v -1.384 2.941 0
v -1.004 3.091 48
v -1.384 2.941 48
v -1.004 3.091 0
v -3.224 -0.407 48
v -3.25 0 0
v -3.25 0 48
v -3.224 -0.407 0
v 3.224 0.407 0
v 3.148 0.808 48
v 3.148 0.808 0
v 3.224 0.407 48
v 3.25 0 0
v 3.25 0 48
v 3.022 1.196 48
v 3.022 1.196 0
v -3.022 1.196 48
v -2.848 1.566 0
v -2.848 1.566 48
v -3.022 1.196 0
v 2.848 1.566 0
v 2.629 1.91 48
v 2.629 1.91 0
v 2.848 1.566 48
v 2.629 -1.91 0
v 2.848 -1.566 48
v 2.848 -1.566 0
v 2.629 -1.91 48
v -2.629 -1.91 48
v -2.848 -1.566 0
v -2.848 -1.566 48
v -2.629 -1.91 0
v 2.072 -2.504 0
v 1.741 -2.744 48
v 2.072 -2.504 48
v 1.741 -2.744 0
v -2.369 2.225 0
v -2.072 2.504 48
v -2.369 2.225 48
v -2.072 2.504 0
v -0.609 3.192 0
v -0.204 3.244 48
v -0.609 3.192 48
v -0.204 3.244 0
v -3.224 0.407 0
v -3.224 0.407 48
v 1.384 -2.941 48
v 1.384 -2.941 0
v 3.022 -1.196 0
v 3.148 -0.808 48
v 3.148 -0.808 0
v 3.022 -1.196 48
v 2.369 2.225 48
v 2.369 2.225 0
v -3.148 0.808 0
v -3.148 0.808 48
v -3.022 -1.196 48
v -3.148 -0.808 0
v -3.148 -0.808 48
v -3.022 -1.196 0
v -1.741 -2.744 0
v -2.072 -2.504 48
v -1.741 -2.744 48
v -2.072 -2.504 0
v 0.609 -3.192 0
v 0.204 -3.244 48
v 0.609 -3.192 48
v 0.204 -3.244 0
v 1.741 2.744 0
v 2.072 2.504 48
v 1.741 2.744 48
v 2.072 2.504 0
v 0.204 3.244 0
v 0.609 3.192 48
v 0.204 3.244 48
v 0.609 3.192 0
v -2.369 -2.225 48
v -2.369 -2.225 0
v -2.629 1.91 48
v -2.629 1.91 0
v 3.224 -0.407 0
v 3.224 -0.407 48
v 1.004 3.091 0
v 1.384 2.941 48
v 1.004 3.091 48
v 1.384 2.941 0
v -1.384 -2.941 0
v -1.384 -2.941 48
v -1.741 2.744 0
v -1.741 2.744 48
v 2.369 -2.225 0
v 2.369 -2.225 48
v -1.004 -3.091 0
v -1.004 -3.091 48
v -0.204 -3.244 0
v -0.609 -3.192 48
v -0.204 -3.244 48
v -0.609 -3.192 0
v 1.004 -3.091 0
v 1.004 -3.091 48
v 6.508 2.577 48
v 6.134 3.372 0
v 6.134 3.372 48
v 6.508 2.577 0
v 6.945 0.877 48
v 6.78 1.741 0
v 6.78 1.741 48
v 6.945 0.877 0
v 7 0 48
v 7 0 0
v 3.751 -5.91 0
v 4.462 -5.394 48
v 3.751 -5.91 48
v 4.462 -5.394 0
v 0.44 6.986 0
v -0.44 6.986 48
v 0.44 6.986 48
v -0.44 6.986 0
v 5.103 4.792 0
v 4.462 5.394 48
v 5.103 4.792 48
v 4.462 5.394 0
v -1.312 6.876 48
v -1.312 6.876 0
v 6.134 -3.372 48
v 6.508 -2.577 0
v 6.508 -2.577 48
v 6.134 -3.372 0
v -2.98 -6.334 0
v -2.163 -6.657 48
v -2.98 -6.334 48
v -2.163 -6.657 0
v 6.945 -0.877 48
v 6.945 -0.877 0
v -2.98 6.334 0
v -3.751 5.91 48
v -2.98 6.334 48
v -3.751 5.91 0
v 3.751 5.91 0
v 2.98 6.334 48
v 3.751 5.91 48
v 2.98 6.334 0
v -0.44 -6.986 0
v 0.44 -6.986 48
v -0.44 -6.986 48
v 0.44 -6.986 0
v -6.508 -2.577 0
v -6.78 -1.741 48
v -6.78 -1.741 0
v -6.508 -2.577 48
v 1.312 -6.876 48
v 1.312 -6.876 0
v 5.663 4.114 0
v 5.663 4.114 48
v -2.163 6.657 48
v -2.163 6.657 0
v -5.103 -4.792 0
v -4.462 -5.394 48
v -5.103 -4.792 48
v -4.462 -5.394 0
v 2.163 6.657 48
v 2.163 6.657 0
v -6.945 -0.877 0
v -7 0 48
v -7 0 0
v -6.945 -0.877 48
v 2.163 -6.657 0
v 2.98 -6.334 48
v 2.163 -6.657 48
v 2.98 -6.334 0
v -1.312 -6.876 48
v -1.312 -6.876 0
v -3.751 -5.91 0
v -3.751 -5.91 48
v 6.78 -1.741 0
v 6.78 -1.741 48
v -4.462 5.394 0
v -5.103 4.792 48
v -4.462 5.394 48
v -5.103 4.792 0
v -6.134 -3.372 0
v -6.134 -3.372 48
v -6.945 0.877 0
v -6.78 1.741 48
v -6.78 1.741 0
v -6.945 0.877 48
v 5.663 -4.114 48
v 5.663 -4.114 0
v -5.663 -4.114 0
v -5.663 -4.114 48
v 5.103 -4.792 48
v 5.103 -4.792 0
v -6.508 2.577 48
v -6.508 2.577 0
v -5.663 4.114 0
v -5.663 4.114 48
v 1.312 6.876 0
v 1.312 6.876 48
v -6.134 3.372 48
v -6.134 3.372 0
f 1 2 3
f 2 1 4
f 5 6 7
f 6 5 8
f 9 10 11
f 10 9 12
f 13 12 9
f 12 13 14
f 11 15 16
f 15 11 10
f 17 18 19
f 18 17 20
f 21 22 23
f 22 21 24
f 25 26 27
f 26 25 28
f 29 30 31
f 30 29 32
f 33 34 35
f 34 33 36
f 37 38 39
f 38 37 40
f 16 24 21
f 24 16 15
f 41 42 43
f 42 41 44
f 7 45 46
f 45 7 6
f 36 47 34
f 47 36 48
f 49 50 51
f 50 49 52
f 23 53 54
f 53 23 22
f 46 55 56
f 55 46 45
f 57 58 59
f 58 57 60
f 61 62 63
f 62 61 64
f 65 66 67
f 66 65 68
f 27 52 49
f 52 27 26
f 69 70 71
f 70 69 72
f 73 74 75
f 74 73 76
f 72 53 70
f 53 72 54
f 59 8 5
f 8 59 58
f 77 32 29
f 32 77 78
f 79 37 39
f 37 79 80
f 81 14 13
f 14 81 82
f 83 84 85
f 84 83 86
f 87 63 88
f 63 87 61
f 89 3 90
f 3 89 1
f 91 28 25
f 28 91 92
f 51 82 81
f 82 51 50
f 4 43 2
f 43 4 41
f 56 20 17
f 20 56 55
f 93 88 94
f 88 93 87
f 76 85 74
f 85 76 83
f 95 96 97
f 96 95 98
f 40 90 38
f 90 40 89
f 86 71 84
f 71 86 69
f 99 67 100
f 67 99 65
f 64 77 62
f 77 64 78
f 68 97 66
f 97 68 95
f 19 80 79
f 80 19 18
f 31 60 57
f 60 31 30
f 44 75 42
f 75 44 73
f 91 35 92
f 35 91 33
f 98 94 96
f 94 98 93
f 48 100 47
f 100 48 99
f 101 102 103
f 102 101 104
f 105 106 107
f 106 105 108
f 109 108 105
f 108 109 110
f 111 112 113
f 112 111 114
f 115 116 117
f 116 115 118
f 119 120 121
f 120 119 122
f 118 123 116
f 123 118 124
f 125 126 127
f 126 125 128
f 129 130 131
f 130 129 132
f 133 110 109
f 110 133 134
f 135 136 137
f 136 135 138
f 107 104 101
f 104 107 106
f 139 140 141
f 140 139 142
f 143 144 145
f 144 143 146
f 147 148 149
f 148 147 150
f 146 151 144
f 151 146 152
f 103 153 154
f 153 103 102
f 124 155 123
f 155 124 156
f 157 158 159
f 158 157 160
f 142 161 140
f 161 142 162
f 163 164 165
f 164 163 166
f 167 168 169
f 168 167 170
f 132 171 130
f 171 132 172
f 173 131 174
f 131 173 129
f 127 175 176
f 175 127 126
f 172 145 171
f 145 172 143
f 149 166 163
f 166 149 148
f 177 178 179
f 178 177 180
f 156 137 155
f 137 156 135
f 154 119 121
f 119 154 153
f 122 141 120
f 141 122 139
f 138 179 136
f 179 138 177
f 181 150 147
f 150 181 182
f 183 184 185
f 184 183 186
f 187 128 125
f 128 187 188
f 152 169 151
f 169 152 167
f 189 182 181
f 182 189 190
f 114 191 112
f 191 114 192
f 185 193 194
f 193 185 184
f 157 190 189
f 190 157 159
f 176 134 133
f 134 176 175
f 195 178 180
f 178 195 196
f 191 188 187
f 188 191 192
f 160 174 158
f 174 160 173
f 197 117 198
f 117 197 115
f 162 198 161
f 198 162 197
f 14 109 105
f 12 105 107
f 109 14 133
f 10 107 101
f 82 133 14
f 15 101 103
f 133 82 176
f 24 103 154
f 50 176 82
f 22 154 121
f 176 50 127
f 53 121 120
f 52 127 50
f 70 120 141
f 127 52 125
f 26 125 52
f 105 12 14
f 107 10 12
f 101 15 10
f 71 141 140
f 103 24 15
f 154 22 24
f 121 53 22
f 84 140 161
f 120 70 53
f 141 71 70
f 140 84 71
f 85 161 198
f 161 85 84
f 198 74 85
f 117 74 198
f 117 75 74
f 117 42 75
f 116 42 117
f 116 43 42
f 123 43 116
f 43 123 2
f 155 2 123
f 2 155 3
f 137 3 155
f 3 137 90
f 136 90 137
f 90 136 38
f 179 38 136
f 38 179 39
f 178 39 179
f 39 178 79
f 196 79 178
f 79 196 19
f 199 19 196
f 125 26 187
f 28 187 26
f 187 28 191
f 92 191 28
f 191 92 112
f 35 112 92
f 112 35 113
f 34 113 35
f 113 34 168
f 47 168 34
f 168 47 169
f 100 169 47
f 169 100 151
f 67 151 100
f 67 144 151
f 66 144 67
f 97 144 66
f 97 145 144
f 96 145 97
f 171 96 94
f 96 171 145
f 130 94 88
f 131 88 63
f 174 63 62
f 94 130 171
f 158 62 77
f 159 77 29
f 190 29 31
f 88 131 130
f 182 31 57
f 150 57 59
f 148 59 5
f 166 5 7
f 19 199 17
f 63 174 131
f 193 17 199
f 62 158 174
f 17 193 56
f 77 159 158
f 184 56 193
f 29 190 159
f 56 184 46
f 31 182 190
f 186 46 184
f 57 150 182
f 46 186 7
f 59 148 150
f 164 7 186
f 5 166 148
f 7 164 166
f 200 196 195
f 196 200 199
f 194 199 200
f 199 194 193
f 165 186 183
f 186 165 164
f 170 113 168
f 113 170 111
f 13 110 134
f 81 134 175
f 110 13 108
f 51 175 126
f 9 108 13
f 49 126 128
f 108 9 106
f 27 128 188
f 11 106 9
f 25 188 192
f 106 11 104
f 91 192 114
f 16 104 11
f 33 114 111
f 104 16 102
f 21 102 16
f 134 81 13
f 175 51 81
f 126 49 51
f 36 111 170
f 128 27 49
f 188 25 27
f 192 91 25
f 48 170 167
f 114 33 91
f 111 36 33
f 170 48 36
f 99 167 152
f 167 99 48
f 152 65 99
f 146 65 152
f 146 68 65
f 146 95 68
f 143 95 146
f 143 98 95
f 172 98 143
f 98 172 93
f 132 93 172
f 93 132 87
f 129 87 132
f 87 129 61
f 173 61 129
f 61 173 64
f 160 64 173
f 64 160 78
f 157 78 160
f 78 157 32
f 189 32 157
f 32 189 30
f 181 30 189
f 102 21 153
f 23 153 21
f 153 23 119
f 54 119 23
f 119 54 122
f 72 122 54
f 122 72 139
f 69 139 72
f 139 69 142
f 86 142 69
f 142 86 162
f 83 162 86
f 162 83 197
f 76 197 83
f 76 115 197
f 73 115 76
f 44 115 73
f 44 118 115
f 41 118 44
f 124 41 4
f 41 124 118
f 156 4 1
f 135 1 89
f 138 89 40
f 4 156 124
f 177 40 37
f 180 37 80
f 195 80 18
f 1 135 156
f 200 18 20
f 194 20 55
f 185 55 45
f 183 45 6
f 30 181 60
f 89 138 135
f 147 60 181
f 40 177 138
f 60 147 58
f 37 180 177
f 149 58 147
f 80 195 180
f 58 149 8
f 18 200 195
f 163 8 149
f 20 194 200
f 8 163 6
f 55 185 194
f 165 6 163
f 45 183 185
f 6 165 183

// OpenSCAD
$fn = 50;


difference() {
	union() {
		*color(alpha = 1.0000000000, c = "gray") {
			translate(v = [0, 7, 0]) {
				linear_extrude(height = 1) {
					text(font = "Arial:style=Bold", halign = "center", size = 4.5000000000, text = "COMMENT plate main", valign = "center");
				}
			}
		}
		cylinder(h = 48, r = 7.0000000000);
	}
	union() {
		*color(alpha = 1.0000000000, c = "gray") {
			translate(v = [0, 7, 0]) {
				linear_extrude(height = 1) {
					text(font = "Arial:style=Bold", halign = "center", size = 4.5000000000, text = "COMMENT holes main", valign = "center");
				}
			}
		}
		translate(v = [0, 0, -100]) {
			cylinder(h = 200, r = 3.2500000000);
		}
		translate(v = [0, 0, -100]) {
			cylinder(h = 200, r = 1.8000000000);
		}
	}
}
